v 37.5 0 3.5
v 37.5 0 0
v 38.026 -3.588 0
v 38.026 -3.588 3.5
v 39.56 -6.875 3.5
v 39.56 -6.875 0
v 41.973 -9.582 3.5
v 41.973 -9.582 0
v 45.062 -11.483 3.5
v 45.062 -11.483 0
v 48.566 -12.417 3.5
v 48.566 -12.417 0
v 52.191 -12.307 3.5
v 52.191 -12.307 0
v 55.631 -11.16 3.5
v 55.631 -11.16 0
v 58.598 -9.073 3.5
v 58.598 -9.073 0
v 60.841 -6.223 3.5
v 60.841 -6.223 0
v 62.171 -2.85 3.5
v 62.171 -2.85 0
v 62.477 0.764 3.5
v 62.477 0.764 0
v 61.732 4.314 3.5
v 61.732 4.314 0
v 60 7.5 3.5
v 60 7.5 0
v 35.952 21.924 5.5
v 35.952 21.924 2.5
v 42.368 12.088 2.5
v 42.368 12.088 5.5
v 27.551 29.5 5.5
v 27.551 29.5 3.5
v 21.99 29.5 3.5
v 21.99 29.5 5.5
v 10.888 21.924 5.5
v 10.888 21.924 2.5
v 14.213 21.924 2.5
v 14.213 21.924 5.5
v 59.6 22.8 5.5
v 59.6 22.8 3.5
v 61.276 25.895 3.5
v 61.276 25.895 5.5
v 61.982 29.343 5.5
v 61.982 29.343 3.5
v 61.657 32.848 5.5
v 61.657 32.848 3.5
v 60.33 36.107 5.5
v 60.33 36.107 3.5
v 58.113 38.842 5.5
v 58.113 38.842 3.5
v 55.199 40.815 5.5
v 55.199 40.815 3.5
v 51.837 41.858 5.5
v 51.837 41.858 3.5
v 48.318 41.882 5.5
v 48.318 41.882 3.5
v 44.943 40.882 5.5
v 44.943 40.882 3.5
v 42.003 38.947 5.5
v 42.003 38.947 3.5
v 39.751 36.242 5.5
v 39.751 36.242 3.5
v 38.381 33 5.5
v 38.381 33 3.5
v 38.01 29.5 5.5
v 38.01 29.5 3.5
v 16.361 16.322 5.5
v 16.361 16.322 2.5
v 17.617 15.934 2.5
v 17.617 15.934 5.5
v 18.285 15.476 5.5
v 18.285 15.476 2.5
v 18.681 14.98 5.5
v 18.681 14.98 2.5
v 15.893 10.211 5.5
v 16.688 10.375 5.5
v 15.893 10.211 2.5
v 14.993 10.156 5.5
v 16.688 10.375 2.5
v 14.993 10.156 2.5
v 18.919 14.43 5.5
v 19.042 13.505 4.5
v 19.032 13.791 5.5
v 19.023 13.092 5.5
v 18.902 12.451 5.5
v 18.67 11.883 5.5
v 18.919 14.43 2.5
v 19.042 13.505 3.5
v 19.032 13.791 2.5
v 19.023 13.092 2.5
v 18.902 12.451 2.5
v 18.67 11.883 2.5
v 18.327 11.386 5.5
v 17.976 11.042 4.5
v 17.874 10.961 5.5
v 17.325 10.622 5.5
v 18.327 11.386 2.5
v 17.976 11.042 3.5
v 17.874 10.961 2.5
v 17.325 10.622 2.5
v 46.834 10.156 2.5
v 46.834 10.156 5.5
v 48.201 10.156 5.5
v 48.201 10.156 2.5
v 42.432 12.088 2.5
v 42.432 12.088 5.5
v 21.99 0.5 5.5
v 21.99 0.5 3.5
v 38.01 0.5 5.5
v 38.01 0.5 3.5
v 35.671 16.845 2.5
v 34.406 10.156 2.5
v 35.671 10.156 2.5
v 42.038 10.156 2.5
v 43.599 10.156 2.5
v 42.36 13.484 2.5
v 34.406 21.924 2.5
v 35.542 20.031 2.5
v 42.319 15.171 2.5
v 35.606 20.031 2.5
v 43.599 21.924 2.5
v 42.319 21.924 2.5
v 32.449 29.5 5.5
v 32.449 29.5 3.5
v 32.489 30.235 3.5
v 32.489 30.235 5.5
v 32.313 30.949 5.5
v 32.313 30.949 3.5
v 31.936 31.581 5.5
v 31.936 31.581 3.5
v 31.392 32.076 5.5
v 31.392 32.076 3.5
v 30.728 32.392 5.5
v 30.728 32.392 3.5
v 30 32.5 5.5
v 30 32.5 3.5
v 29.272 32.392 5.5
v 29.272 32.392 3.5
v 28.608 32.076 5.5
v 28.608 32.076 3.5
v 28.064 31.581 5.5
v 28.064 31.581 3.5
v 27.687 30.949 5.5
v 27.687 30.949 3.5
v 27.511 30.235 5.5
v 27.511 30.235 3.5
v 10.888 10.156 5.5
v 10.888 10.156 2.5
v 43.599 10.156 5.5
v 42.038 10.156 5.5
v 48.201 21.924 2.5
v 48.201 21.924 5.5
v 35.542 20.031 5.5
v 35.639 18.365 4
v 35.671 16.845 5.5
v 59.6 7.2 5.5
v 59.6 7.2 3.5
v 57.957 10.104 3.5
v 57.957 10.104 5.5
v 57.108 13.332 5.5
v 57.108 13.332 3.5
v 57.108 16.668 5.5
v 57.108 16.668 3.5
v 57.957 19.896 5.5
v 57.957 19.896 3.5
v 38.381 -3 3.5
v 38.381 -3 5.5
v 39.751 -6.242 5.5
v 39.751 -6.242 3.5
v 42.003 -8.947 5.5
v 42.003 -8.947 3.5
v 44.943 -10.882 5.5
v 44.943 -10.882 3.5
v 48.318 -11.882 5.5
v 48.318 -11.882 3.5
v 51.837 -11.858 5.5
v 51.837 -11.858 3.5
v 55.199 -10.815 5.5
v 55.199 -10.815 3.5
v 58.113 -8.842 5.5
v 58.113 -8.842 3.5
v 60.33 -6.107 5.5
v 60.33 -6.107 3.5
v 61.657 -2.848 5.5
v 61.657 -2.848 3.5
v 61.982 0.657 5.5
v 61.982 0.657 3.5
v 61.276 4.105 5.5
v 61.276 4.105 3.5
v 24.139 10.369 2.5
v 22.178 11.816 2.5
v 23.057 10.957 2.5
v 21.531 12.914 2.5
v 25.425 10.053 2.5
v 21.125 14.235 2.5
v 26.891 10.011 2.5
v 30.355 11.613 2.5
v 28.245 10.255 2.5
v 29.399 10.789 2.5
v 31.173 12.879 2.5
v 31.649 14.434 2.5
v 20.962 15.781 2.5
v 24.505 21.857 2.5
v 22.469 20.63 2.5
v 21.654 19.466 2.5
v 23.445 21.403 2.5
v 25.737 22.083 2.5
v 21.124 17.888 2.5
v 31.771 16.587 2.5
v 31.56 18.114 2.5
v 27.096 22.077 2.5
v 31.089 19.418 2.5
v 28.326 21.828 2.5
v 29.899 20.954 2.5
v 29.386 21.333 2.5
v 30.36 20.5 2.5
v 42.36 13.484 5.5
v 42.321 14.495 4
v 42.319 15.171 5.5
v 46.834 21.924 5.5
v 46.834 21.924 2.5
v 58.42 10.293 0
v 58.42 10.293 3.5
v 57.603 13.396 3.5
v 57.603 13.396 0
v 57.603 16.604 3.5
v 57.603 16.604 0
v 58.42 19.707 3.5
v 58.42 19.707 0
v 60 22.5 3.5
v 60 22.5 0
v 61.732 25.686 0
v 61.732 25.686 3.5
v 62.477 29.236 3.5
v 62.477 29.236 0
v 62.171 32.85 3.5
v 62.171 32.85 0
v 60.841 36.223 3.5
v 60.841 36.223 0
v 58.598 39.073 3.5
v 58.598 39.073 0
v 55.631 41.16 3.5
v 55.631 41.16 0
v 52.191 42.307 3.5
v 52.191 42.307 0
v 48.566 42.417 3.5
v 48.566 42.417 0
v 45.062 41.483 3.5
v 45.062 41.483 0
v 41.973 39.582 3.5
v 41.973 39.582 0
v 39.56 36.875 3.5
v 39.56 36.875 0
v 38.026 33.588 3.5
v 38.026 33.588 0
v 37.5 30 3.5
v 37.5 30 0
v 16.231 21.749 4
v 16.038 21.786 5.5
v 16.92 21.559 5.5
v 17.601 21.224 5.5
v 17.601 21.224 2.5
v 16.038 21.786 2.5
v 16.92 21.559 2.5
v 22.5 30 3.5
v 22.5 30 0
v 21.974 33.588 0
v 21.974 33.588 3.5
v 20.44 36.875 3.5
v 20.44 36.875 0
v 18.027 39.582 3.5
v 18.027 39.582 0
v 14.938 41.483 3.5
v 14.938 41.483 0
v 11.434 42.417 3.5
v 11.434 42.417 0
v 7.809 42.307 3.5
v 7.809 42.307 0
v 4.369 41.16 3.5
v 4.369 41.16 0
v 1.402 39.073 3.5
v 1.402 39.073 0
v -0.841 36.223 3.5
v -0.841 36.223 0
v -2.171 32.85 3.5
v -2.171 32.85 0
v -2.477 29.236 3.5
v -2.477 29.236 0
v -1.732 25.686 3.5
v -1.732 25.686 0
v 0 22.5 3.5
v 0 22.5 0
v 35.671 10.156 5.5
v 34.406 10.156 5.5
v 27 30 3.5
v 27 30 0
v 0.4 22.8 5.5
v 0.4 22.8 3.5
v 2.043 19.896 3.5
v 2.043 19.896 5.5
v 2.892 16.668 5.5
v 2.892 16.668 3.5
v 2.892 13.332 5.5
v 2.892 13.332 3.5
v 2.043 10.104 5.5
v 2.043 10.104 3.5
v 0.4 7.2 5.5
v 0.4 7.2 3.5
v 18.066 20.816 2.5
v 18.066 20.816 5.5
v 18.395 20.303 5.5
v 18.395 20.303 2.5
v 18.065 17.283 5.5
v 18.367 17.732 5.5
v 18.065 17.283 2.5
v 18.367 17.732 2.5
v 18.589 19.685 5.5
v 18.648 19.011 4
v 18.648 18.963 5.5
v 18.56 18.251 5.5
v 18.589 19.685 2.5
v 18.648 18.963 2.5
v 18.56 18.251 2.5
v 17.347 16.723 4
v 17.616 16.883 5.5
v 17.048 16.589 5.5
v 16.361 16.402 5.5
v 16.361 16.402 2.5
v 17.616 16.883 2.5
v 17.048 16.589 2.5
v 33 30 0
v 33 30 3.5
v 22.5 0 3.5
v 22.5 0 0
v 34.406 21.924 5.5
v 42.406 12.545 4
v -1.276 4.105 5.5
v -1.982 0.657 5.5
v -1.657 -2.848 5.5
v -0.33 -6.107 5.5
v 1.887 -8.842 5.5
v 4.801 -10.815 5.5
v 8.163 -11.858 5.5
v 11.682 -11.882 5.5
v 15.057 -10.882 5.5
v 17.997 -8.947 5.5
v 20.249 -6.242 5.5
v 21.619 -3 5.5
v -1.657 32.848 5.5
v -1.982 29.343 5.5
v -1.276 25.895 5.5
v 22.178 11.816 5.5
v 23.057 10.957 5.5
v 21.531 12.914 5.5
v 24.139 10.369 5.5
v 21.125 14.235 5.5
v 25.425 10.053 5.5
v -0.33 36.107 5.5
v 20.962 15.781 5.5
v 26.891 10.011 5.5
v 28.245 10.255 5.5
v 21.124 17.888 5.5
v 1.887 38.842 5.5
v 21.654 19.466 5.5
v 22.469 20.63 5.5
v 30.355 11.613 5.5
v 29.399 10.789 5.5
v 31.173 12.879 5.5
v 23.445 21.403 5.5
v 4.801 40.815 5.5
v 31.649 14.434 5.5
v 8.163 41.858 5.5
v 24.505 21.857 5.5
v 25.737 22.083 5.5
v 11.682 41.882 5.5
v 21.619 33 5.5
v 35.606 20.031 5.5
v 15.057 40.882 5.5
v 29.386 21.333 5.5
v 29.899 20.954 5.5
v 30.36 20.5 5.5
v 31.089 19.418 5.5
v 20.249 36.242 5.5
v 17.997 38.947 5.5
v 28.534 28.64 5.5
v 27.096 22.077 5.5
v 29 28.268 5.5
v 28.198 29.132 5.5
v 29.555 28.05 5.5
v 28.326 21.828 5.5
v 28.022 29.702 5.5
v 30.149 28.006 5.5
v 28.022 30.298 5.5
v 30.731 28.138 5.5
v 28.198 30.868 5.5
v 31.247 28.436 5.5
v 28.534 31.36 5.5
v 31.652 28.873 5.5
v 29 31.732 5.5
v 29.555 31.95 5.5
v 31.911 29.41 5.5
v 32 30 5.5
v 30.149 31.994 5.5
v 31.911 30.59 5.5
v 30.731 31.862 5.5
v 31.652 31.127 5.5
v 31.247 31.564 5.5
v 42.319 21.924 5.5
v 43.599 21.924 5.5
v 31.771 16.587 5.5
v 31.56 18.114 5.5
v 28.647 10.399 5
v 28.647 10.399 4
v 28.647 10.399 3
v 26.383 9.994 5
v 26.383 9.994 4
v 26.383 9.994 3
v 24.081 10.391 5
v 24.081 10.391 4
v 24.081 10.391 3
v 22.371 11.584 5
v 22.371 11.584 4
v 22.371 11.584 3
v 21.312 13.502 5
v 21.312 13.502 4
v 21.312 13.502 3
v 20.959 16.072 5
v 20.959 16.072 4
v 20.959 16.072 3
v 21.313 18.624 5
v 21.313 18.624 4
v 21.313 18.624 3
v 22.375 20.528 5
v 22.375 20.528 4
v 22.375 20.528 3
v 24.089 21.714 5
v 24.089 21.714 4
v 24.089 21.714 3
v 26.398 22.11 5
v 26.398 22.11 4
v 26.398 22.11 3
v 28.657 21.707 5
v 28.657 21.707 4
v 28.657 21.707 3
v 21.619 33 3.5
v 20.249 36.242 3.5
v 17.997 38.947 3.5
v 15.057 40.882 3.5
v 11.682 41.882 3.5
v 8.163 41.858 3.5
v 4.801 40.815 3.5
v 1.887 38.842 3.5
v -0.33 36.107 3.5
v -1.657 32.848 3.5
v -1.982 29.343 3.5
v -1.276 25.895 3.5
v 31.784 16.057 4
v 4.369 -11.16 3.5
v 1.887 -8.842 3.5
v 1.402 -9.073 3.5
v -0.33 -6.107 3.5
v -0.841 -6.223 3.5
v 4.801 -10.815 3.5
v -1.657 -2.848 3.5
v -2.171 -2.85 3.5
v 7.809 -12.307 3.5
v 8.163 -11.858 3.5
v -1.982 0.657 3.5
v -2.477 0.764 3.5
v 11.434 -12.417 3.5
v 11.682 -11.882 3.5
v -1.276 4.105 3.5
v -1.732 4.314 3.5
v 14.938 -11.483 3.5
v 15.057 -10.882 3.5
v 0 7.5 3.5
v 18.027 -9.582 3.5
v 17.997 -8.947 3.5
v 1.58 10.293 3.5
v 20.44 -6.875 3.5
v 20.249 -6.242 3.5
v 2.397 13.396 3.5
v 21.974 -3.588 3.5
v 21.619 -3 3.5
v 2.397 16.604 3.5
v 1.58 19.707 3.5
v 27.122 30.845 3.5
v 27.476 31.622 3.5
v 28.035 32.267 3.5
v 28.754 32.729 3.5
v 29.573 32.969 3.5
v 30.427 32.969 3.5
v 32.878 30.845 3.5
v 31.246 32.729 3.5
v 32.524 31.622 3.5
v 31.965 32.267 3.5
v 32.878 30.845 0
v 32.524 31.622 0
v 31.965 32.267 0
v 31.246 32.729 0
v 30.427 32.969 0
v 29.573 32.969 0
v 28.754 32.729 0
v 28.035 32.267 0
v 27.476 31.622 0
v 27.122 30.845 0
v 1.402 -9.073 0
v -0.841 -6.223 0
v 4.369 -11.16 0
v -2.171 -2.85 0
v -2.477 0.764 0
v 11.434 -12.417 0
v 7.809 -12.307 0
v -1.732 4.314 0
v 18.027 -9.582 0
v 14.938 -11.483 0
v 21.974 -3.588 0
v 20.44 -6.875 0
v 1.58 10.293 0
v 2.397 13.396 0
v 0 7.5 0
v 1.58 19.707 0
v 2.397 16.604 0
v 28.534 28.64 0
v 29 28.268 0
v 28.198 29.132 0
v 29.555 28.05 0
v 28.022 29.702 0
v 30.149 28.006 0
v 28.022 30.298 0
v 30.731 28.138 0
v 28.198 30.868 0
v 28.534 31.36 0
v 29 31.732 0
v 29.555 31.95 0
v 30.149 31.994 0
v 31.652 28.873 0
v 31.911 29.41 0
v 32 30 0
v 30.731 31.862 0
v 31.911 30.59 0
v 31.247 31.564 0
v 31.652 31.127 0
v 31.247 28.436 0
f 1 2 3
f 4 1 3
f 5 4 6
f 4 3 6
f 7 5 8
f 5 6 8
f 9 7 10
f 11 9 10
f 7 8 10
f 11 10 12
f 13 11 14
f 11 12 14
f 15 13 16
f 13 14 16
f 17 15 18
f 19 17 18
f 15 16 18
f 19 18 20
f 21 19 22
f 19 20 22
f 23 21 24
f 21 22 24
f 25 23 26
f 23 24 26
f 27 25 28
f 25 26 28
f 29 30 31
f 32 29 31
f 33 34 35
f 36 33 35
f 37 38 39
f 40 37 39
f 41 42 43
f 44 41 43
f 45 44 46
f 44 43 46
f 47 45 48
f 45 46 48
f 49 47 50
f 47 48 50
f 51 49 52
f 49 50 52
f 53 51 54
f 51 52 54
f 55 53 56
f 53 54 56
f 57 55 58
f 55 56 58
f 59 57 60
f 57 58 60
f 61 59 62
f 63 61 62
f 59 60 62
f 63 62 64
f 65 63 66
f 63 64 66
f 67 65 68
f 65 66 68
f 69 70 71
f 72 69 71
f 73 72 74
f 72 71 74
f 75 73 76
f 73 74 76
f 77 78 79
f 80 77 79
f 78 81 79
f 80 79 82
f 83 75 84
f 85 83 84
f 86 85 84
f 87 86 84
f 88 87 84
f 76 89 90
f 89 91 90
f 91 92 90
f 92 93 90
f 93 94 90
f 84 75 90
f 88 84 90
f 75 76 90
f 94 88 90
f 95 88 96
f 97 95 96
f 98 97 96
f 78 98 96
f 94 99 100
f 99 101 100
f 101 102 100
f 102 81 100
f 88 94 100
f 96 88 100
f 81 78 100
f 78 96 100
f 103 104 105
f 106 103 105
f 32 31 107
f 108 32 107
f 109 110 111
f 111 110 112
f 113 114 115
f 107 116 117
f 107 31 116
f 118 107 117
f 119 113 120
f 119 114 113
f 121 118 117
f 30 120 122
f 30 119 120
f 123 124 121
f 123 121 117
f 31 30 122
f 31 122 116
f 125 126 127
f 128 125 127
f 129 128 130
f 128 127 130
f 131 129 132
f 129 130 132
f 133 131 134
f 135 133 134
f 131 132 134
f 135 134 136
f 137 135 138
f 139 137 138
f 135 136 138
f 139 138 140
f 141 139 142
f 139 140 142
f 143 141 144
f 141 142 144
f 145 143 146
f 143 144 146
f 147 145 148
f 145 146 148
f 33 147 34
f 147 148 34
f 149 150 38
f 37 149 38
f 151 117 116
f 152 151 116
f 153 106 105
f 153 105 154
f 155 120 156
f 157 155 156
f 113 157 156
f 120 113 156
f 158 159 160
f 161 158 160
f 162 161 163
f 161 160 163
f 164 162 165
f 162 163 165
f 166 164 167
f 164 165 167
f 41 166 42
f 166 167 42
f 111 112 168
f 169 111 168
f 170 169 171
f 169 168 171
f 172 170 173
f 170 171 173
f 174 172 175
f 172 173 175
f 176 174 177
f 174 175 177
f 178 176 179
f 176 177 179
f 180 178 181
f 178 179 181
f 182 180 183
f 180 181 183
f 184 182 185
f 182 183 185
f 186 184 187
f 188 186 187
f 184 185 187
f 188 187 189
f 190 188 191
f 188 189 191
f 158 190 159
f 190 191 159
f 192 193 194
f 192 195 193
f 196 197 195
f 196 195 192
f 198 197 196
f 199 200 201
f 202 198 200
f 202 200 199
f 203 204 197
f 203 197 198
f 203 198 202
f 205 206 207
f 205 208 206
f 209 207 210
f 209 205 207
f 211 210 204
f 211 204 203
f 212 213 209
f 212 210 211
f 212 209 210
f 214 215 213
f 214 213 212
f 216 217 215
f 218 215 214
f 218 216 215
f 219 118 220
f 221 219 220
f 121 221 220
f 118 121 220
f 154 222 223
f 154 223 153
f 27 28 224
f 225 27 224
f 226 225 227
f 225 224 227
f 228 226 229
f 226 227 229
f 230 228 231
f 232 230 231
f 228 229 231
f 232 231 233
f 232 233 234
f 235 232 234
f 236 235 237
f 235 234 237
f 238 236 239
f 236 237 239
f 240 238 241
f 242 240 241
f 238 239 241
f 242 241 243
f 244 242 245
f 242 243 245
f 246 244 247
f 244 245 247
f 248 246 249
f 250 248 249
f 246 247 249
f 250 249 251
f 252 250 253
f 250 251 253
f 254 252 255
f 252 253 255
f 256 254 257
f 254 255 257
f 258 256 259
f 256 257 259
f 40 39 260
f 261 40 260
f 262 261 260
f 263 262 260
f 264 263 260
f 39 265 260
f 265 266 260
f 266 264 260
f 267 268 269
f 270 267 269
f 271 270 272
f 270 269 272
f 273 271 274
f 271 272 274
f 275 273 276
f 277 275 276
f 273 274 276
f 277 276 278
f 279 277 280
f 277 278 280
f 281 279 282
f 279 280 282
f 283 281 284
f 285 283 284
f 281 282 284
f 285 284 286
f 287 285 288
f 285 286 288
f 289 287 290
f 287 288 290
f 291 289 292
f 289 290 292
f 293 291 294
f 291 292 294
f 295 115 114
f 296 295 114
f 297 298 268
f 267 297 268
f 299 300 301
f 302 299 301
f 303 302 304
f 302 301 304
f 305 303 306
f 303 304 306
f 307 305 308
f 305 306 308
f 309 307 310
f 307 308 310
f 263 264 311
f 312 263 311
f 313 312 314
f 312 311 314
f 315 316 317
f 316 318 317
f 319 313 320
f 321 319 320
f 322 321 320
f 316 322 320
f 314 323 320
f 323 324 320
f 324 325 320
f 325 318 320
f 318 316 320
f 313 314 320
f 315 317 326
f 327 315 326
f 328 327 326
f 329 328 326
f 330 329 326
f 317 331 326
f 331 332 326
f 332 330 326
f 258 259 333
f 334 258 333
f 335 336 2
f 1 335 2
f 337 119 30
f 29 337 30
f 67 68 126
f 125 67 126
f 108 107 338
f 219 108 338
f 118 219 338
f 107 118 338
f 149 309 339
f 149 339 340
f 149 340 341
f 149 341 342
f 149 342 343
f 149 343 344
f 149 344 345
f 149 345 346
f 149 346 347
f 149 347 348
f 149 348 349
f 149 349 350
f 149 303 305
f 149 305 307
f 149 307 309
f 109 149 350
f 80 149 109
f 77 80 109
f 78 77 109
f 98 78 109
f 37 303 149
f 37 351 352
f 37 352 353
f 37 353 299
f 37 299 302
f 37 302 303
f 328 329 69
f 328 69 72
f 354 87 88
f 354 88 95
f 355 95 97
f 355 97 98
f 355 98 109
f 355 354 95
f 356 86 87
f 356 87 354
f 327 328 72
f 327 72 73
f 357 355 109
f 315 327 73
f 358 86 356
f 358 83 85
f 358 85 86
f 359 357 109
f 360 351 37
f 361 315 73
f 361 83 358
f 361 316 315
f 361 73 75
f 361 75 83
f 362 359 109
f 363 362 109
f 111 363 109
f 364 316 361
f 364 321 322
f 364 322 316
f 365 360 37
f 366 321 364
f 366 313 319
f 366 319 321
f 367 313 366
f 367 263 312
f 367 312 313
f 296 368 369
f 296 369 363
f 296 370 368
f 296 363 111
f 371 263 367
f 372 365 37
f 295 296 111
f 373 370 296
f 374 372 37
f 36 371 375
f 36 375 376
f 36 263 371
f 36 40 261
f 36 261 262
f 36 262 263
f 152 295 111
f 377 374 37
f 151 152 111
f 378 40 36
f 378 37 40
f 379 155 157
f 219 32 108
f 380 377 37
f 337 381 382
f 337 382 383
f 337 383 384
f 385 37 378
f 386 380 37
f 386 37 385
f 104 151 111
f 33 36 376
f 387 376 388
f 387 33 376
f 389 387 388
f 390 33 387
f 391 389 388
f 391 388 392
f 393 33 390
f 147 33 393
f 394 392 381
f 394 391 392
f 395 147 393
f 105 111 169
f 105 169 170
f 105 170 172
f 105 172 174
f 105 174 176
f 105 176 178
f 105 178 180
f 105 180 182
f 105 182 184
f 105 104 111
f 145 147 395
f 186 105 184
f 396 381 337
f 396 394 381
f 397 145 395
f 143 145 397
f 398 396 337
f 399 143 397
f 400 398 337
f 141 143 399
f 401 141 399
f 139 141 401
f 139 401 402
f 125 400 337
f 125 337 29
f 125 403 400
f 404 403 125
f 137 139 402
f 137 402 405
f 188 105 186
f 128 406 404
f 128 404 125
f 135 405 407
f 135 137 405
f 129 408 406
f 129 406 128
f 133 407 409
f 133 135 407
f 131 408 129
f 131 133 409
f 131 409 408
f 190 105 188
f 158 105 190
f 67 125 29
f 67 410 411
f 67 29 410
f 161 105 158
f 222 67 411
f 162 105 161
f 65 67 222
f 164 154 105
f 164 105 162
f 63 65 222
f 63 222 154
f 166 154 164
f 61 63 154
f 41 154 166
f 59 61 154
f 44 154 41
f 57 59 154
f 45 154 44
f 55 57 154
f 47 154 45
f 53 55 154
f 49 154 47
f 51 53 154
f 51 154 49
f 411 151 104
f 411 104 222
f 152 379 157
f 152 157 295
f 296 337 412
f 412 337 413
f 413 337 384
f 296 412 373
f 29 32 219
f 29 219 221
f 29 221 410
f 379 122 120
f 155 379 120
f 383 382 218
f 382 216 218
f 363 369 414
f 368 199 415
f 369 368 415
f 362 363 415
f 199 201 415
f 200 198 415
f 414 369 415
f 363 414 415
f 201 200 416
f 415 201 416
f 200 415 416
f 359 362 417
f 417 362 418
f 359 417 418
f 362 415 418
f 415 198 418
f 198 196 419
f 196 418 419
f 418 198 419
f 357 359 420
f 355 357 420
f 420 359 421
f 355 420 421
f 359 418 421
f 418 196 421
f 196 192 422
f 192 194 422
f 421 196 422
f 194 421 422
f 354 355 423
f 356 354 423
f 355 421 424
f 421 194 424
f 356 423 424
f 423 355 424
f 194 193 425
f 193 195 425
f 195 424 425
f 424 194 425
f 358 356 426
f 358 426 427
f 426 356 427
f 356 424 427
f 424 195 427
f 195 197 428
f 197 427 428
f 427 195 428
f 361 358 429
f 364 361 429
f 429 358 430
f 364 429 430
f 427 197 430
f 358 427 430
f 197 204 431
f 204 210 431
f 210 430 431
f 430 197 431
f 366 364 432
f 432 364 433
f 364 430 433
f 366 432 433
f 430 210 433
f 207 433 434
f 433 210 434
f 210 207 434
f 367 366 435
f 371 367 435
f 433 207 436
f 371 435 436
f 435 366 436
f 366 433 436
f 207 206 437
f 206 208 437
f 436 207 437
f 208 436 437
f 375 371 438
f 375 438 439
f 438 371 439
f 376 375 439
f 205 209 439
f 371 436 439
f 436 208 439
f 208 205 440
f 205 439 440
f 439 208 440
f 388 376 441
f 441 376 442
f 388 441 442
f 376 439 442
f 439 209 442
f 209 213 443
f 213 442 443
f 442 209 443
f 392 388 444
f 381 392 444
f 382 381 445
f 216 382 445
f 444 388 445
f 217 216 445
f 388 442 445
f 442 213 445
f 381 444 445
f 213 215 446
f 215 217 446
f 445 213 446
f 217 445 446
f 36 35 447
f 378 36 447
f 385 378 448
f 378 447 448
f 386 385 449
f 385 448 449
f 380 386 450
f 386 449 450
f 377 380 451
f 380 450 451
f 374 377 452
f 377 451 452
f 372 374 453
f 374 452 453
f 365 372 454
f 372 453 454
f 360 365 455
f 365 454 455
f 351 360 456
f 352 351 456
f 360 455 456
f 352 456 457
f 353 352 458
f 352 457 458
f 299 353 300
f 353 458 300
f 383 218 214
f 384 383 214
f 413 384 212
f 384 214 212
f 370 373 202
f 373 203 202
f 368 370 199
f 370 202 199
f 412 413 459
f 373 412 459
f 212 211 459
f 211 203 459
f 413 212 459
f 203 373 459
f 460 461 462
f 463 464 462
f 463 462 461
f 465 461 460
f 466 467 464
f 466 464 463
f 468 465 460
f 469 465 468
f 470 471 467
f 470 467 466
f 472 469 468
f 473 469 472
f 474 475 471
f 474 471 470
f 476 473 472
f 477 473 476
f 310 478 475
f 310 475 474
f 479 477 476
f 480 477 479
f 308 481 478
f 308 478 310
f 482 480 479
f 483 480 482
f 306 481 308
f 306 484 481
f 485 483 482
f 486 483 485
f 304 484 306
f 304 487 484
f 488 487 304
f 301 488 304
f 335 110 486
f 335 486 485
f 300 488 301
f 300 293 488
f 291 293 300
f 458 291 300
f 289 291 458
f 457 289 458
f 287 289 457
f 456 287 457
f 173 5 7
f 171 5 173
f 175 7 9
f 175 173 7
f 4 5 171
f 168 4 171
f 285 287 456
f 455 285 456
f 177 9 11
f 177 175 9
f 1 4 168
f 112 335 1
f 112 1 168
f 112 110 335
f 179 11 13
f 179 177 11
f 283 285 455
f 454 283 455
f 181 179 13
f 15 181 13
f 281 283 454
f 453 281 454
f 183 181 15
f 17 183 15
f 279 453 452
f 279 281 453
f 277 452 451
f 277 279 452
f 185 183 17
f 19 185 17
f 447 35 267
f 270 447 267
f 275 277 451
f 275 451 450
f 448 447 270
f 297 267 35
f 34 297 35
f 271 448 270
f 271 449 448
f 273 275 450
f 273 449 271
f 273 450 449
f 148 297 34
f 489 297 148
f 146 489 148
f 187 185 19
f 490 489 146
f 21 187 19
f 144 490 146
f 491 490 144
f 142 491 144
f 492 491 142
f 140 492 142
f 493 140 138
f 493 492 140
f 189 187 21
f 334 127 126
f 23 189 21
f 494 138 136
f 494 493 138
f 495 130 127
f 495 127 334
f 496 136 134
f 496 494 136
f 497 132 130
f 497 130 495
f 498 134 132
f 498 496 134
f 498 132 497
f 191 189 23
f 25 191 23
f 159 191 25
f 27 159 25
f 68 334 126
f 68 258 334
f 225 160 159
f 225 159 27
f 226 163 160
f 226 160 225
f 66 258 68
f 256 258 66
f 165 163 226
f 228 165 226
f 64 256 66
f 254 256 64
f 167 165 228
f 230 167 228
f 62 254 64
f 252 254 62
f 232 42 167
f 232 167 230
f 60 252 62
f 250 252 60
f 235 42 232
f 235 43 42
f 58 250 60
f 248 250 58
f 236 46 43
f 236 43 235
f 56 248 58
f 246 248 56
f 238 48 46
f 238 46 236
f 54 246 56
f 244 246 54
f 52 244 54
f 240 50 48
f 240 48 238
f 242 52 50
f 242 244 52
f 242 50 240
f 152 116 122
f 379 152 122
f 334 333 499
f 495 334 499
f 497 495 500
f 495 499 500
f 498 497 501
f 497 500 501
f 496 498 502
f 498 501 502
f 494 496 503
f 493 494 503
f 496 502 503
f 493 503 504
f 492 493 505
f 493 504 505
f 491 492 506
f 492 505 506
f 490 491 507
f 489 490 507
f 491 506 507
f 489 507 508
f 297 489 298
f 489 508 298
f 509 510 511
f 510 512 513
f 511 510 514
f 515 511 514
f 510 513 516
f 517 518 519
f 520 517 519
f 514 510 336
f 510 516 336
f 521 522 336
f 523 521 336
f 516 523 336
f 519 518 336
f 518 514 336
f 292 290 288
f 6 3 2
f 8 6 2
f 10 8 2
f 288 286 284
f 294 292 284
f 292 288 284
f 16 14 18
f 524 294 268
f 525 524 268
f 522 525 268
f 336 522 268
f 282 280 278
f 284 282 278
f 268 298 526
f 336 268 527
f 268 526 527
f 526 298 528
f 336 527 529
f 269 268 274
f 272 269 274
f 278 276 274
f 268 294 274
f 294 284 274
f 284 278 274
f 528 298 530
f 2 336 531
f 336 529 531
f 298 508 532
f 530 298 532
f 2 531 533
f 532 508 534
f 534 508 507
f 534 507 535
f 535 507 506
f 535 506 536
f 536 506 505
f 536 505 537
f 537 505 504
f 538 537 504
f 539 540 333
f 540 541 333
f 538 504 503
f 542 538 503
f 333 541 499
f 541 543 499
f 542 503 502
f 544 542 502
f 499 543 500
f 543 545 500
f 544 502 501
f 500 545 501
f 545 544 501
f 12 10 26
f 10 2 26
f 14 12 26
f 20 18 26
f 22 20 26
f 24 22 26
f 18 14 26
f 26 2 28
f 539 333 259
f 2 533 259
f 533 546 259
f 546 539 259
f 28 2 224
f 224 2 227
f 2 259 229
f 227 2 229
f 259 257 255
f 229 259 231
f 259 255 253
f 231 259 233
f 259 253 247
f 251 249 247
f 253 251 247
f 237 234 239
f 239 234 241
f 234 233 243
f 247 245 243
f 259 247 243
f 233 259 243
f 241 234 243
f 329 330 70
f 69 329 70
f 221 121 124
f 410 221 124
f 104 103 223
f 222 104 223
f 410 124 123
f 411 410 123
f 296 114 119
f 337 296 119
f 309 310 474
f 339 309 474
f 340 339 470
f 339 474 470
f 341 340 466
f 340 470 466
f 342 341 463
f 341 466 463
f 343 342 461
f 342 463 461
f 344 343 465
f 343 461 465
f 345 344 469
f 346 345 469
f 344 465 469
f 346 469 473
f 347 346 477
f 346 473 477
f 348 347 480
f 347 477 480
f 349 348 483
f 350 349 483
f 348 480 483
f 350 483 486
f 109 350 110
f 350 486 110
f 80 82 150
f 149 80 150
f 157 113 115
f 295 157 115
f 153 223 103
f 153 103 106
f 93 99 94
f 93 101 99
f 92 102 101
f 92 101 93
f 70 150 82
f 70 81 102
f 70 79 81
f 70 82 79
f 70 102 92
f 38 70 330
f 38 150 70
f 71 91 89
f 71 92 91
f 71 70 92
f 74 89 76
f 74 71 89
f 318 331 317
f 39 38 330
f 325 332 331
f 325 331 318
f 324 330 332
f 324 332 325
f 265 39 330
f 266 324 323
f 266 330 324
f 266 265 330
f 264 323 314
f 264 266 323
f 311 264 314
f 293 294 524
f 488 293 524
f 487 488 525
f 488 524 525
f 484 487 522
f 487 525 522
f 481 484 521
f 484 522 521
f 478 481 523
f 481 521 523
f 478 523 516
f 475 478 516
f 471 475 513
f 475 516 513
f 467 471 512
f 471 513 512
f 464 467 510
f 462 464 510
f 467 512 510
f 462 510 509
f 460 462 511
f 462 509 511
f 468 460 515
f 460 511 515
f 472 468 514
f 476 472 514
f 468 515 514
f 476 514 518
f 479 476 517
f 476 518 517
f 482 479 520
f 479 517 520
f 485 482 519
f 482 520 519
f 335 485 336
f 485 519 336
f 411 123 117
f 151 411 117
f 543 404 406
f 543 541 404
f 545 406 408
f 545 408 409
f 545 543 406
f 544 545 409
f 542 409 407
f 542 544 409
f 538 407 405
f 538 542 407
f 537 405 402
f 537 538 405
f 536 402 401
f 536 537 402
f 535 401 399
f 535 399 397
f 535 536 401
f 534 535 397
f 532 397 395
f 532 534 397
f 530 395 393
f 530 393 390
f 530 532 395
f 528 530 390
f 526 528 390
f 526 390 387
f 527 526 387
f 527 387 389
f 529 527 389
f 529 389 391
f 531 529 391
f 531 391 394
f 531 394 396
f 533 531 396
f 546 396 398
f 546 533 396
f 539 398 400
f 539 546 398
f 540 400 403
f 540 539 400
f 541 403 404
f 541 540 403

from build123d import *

# Parameters (mm, degrees)
F0_R     = 2
F1_DEPTH = 3.5
F2_R     = 2
F3_DEPTH = 1
F4_W     = 1.3676754668
F4_H     = 11.7681905988
F4_R     = 2
F5_DEPTH = 3


with BuildPart() as f1:
    # F0 (on Top) → F1 (new body)
    with BuildSketch(Plane.XY):
        with BuildLine():
            Line((27, 30), (22.5, 30))
            ThreePointArc((22.5, 30), (6.0471529248, 41.8585412256), (0, 22.5))
            ThreePointArc((0, 22.5), (2.5, 15), (0, 7.5))
            ThreePointArc((0, 7.5), (6.0471529248, -11.8585412256), (22.5, 0))
            Line((22.5, 0), (37.5, 0))
            ThreePointArc((37.5, 0), (53.9528470752, -11.8585412256), (60, 7.5))
            ThreePointArc((60, 7.5), (57.5, 15), (60, 22.5))
            ThreePointArc((60, 22.5), (53.9528470752, 41.8585412256), (37.5, 30))
            Line((37.5, 30), (33, 30))
            ThreePointArc((33, 30), (30, 33), (27, 30))
        make_face()
        with Locations((30, 30)):
            Circle(F0_R, mode=Mode.SUBTRACT)
    extrude(amount=F1_DEPTH)

    # F2 (on face) → F3 (cut)
    with BuildSketch(Plane.XY.offset(3.5)):
        with BuildLine():
            Line((21.9895788083, 0.5), (38.0104211917, 0.5))
            ThreePointArc((38.0104211917, 0.5), (53.5566869022, -11.4608018166), (59.6, 7.2))
            ThreePointArc((59.6, 7.2), (57, 15), (59.6, 22.8))
            ThreePointArc((59.6, 22.8), (53.5566869022, 41.4608018166), (38.0104211917, 29.5))
            Line((38.0104211917, 29.5), (32.4494897428, 29.5))
            ThreePointArc((32.4494897428, 29.5), (30, 32.5), (27.5505102572, 29.5))
            Line((27.5505102572, 29.5), (21.9895788083, 29.5))
            ThreePointArc((21.9895788083, 29.5), (6.4433130978, 41.4608018166), (0.4, 22.8))
            ThreePointArc((0.4, 22.8), (3, 15), (0.4, 7.2))
            ThreePointArc((0.4, 7.2), (6.4433130978, -11.4608018166), (21.9895788083, 0.5))
        make_face()
        with Locations((30, 30)):
            Circle(F2_R, mode=Mode.SUBTRACT)
    extrude(amount=-F3_DEPTH, mode=Mode.SUBTRACT)

    # F4 (on face) → F5 (join)
    with BuildSketch(Plane.XY.offset(2.5)):
        with BuildLine():
            ThreePointArc((0.4, 7.2), (6.4433130978, -11.4608018166), (21.9895788083, 0.5))
            Line((21.9895788083, 0.5), (38.0104211917, 0.5))
            ThreePointArc((38.0104211917, 0.5), (53.5566869022, -11.4608018166), (59.6, 7.2))
            ThreePointArc((59.6, 7.2), (57, 15), (59.6, 22.8))
            ThreePointArc((59.6, 22.8), (53.5566869022, 41.4608018166), (38.0104211917, 29.5))
            Line((38.0104211917, 29.5), (32.4494897428, 29.5))
            ThreePointArc((32.4494897428, 29.5), (30, 32.5), (27.5505102572, 29.5))
            Line((27.5505102572, 29.5), (21.9895788083, 29.5))
            ThreePointArc((21.9895788083, 29.5), (6.4433130978, 41.4608018166), (0.4, 22.8))
            ThreePointArc((0.4, 22.8), (3, 15), (0.4, 7.2))
        make_face()
        with BuildLine():
            Line((10.8878203307, 10.1561439622), (10.8878203307, 21.924334561))
            Line((10.8878203307, 21.924334561), (14.2129974073, 21.924334561))
            add(Edge.make_bspline(
                [(14.2129974073, 21.924334561), (16.554272359, 21.924334561), (17.6012781542, 21.2237550375)],
                knots=[0, 0, 0, 1, 1, 1], degree=2))
            add(Edge.make_bspline(
                [(17.6012781542, 21.2237550375), (18.6482839495, 20.523175514), (18.6482839495, 19.0112630864)],
                knots=[0, 0, 0, 1, 1, 1], degree=2))
            add(Edge.make_bspline(
                [(18.6482839495, 19.0112630864), (18.6482839495, 17.9629694612), (18.0648969566, 17.2829952178)],
                knots=[0, 0, 0, 1, 1, 1], degree=2))
            add(Edge.make_bspline(
                [(18.0648969566, 17.2829952178), (17.4815099636, 16.6030209744), (16.361097858, 16.4021194934)],
                knots=[0, 0, 0, 1, 1, 1], degree=2))
            Line((16.361097858, 16.4021194934), (16.361097858, 16.322274033))
            add(Edge.make_bspline(
                [(16.361097858, 16.322274033), (19.0423599314, 15.8638065507), (19.0423599314, 13.5045019789)],
                knots=[0, 0, 0, 1, 1, 1], degree=2))
            add(Edge.make_bspline(
                [(19.0423599314, 13.5045019789), (19.0423599314, 11.928198051), (17.9760366861, 11.0421710066)],
                knots=[0, 0, 0, 1, 1, 1], degree=2))
            add(Edge.make_bspline(
                [(17.9760366861, 11.0421710066), (16.9097134408, 10.1561439622), (14.9934223912, 10.1561439622)],
                knots=[0, 0, 0, 1, 1, 1], degree=2))
            Line((14.9934223912, 10.1561439622), (10.8878203307, 10.1561439622))
        make_face(mode=Mode.SUBTRACT)
        with BuildLine():
            add(Edge.make_bspline(
                [(30.359810028, 20.4999945739), (31.7841500152, 18.8902070658), (31.7841500152, 16.0569810517)],
                knots=[0, 0, 0, 1, 1, 1], degree=2))
            add(Edge.make_bspline(
                [(31.7841500152, 16.0569810517), (31.7841500152, 13.2314820175), (30.354658708, 11.6126796994)],
                knots=[0, 0, 0, 1, 1, 1], degree=2))
            add(Edge.make_bspline(
                [(30.354658708, 11.6126796994), (28.9251674009, 9.9938773813), (26.3829909681, 9.9938773813)],
                knots=[0, 0, 0, 1, 1, 1], degree=2))
            add(Edge.make_bspline(
                [(26.3829909681, 9.9938773813), (23.7841500152, 9.9938773813), (22.3714004981, 11.5843474393)],
                knots=[0, 0, 0, 1, 1, 1], degree=2))
            add(Edge.make_bspline(
                [(22.3714004981, 11.5843474393), (20.958650981, 13.1748174973), (20.958650981, 16.0724350117)],
                knots=[0, 0, 0, 1, 1, 1], degree=2))
            add(Edge.make_bspline(
                [(20.958650981, 16.0724350117), (20.958650981, 18.9468715861), (22.3752639881, 20.528326834)],
                knots=[0, 0, 0, 1, 1, 1], degree=2))
            add(Edge.make_bspline(
                [(22.3752639881, 20.528326834), (23.7918769952, 22.1097820819), (26.3984449282, 22.1097820819)],
                knots=[0, 0, 0, 1, 1, 1], degree=2))
            add(Edge.make_bspline(
                [(26.3984449282, 22.1097820819), (28.9354700409, 22.1097820819), (30.359810028, 20.4999945739)],
                knots=[0, 0, 0, 1, 1, 1], degree=2))
        make_face(mode=Mode.SUBTRACT)
        with BuildLine():
            Line((43.5987024942, 21.924334561), (43.5987024942, 10.1561439622))
            Line((43.5987024942, 10.1561439622), (42.0378525264, 10.1561439622))
            Line((42.0378525264, 10.1561439622), (35.6064294743, 20.0312244515))
            Line((35.6064294743, 20.0312244515), (35.5420379739, 20.0312244515))
            add(Edge.make_bspline(
                [(35.5420379739, 20.0312244515), (35.6708209746, 18.2926539428), (35.6708209746, 16.8451330156)],
                knots=[0, 0, 0, 1, 1, 1], degree=2))
            Line((35.6708209746, 16.8451330156), (35.6708209746, 10.1561439622))
            Line((35.6708209746, 10.1561439622), (34.4061719083, 10.1561439622))
            Line((34.4061719083, 10.1561439622), (34.4061719083, 21.924334561))
            Line((34.4061719083, 21.924334561), (35.951567916, 21.924334561))
            Line((35.951567916, 21.924334561), (42.3675370081, 12.0878889718))
            Line((42.3675370081, 12.0878889718), (42.4319285084, 12.0878889718))
            add(Edge.make_bspline(
                [(42.4319285084, 12.0878889718), (42.4164745483, 12.3042444129), (42.359810028, 13.4838966988)],
                knots=[0, 0, 0, 1, 1, 1], degree=2))
            add(Edge.make_bspline(
                [(42.359810028, 13.4838966988), (42.3031455078, 14.6635489847), (42.3185994678, 15.1709540072)],
                knots=[0, 0, 0, 1, 1, 1], degree=2))
            Line((42.3185994678, 15.1709540072), (42.3185994678, 21.924334561))
            Line((42.3185994678, 21.924334561), (43.5987024942, 21.924334561))
        make_face(mode=Mode.SUBTRACT)
        with Locations((47.5175692038, 16.0402392616)):
            Rectangle(F4_W, F4_H, mode=Mode.SUBTRACT)
        with Locations((30, 30)):
            Circle(F4_R, mode=Mode.SUBTRACT)
    extrude(amount=F5_DEPTH)


solid = f1.part
